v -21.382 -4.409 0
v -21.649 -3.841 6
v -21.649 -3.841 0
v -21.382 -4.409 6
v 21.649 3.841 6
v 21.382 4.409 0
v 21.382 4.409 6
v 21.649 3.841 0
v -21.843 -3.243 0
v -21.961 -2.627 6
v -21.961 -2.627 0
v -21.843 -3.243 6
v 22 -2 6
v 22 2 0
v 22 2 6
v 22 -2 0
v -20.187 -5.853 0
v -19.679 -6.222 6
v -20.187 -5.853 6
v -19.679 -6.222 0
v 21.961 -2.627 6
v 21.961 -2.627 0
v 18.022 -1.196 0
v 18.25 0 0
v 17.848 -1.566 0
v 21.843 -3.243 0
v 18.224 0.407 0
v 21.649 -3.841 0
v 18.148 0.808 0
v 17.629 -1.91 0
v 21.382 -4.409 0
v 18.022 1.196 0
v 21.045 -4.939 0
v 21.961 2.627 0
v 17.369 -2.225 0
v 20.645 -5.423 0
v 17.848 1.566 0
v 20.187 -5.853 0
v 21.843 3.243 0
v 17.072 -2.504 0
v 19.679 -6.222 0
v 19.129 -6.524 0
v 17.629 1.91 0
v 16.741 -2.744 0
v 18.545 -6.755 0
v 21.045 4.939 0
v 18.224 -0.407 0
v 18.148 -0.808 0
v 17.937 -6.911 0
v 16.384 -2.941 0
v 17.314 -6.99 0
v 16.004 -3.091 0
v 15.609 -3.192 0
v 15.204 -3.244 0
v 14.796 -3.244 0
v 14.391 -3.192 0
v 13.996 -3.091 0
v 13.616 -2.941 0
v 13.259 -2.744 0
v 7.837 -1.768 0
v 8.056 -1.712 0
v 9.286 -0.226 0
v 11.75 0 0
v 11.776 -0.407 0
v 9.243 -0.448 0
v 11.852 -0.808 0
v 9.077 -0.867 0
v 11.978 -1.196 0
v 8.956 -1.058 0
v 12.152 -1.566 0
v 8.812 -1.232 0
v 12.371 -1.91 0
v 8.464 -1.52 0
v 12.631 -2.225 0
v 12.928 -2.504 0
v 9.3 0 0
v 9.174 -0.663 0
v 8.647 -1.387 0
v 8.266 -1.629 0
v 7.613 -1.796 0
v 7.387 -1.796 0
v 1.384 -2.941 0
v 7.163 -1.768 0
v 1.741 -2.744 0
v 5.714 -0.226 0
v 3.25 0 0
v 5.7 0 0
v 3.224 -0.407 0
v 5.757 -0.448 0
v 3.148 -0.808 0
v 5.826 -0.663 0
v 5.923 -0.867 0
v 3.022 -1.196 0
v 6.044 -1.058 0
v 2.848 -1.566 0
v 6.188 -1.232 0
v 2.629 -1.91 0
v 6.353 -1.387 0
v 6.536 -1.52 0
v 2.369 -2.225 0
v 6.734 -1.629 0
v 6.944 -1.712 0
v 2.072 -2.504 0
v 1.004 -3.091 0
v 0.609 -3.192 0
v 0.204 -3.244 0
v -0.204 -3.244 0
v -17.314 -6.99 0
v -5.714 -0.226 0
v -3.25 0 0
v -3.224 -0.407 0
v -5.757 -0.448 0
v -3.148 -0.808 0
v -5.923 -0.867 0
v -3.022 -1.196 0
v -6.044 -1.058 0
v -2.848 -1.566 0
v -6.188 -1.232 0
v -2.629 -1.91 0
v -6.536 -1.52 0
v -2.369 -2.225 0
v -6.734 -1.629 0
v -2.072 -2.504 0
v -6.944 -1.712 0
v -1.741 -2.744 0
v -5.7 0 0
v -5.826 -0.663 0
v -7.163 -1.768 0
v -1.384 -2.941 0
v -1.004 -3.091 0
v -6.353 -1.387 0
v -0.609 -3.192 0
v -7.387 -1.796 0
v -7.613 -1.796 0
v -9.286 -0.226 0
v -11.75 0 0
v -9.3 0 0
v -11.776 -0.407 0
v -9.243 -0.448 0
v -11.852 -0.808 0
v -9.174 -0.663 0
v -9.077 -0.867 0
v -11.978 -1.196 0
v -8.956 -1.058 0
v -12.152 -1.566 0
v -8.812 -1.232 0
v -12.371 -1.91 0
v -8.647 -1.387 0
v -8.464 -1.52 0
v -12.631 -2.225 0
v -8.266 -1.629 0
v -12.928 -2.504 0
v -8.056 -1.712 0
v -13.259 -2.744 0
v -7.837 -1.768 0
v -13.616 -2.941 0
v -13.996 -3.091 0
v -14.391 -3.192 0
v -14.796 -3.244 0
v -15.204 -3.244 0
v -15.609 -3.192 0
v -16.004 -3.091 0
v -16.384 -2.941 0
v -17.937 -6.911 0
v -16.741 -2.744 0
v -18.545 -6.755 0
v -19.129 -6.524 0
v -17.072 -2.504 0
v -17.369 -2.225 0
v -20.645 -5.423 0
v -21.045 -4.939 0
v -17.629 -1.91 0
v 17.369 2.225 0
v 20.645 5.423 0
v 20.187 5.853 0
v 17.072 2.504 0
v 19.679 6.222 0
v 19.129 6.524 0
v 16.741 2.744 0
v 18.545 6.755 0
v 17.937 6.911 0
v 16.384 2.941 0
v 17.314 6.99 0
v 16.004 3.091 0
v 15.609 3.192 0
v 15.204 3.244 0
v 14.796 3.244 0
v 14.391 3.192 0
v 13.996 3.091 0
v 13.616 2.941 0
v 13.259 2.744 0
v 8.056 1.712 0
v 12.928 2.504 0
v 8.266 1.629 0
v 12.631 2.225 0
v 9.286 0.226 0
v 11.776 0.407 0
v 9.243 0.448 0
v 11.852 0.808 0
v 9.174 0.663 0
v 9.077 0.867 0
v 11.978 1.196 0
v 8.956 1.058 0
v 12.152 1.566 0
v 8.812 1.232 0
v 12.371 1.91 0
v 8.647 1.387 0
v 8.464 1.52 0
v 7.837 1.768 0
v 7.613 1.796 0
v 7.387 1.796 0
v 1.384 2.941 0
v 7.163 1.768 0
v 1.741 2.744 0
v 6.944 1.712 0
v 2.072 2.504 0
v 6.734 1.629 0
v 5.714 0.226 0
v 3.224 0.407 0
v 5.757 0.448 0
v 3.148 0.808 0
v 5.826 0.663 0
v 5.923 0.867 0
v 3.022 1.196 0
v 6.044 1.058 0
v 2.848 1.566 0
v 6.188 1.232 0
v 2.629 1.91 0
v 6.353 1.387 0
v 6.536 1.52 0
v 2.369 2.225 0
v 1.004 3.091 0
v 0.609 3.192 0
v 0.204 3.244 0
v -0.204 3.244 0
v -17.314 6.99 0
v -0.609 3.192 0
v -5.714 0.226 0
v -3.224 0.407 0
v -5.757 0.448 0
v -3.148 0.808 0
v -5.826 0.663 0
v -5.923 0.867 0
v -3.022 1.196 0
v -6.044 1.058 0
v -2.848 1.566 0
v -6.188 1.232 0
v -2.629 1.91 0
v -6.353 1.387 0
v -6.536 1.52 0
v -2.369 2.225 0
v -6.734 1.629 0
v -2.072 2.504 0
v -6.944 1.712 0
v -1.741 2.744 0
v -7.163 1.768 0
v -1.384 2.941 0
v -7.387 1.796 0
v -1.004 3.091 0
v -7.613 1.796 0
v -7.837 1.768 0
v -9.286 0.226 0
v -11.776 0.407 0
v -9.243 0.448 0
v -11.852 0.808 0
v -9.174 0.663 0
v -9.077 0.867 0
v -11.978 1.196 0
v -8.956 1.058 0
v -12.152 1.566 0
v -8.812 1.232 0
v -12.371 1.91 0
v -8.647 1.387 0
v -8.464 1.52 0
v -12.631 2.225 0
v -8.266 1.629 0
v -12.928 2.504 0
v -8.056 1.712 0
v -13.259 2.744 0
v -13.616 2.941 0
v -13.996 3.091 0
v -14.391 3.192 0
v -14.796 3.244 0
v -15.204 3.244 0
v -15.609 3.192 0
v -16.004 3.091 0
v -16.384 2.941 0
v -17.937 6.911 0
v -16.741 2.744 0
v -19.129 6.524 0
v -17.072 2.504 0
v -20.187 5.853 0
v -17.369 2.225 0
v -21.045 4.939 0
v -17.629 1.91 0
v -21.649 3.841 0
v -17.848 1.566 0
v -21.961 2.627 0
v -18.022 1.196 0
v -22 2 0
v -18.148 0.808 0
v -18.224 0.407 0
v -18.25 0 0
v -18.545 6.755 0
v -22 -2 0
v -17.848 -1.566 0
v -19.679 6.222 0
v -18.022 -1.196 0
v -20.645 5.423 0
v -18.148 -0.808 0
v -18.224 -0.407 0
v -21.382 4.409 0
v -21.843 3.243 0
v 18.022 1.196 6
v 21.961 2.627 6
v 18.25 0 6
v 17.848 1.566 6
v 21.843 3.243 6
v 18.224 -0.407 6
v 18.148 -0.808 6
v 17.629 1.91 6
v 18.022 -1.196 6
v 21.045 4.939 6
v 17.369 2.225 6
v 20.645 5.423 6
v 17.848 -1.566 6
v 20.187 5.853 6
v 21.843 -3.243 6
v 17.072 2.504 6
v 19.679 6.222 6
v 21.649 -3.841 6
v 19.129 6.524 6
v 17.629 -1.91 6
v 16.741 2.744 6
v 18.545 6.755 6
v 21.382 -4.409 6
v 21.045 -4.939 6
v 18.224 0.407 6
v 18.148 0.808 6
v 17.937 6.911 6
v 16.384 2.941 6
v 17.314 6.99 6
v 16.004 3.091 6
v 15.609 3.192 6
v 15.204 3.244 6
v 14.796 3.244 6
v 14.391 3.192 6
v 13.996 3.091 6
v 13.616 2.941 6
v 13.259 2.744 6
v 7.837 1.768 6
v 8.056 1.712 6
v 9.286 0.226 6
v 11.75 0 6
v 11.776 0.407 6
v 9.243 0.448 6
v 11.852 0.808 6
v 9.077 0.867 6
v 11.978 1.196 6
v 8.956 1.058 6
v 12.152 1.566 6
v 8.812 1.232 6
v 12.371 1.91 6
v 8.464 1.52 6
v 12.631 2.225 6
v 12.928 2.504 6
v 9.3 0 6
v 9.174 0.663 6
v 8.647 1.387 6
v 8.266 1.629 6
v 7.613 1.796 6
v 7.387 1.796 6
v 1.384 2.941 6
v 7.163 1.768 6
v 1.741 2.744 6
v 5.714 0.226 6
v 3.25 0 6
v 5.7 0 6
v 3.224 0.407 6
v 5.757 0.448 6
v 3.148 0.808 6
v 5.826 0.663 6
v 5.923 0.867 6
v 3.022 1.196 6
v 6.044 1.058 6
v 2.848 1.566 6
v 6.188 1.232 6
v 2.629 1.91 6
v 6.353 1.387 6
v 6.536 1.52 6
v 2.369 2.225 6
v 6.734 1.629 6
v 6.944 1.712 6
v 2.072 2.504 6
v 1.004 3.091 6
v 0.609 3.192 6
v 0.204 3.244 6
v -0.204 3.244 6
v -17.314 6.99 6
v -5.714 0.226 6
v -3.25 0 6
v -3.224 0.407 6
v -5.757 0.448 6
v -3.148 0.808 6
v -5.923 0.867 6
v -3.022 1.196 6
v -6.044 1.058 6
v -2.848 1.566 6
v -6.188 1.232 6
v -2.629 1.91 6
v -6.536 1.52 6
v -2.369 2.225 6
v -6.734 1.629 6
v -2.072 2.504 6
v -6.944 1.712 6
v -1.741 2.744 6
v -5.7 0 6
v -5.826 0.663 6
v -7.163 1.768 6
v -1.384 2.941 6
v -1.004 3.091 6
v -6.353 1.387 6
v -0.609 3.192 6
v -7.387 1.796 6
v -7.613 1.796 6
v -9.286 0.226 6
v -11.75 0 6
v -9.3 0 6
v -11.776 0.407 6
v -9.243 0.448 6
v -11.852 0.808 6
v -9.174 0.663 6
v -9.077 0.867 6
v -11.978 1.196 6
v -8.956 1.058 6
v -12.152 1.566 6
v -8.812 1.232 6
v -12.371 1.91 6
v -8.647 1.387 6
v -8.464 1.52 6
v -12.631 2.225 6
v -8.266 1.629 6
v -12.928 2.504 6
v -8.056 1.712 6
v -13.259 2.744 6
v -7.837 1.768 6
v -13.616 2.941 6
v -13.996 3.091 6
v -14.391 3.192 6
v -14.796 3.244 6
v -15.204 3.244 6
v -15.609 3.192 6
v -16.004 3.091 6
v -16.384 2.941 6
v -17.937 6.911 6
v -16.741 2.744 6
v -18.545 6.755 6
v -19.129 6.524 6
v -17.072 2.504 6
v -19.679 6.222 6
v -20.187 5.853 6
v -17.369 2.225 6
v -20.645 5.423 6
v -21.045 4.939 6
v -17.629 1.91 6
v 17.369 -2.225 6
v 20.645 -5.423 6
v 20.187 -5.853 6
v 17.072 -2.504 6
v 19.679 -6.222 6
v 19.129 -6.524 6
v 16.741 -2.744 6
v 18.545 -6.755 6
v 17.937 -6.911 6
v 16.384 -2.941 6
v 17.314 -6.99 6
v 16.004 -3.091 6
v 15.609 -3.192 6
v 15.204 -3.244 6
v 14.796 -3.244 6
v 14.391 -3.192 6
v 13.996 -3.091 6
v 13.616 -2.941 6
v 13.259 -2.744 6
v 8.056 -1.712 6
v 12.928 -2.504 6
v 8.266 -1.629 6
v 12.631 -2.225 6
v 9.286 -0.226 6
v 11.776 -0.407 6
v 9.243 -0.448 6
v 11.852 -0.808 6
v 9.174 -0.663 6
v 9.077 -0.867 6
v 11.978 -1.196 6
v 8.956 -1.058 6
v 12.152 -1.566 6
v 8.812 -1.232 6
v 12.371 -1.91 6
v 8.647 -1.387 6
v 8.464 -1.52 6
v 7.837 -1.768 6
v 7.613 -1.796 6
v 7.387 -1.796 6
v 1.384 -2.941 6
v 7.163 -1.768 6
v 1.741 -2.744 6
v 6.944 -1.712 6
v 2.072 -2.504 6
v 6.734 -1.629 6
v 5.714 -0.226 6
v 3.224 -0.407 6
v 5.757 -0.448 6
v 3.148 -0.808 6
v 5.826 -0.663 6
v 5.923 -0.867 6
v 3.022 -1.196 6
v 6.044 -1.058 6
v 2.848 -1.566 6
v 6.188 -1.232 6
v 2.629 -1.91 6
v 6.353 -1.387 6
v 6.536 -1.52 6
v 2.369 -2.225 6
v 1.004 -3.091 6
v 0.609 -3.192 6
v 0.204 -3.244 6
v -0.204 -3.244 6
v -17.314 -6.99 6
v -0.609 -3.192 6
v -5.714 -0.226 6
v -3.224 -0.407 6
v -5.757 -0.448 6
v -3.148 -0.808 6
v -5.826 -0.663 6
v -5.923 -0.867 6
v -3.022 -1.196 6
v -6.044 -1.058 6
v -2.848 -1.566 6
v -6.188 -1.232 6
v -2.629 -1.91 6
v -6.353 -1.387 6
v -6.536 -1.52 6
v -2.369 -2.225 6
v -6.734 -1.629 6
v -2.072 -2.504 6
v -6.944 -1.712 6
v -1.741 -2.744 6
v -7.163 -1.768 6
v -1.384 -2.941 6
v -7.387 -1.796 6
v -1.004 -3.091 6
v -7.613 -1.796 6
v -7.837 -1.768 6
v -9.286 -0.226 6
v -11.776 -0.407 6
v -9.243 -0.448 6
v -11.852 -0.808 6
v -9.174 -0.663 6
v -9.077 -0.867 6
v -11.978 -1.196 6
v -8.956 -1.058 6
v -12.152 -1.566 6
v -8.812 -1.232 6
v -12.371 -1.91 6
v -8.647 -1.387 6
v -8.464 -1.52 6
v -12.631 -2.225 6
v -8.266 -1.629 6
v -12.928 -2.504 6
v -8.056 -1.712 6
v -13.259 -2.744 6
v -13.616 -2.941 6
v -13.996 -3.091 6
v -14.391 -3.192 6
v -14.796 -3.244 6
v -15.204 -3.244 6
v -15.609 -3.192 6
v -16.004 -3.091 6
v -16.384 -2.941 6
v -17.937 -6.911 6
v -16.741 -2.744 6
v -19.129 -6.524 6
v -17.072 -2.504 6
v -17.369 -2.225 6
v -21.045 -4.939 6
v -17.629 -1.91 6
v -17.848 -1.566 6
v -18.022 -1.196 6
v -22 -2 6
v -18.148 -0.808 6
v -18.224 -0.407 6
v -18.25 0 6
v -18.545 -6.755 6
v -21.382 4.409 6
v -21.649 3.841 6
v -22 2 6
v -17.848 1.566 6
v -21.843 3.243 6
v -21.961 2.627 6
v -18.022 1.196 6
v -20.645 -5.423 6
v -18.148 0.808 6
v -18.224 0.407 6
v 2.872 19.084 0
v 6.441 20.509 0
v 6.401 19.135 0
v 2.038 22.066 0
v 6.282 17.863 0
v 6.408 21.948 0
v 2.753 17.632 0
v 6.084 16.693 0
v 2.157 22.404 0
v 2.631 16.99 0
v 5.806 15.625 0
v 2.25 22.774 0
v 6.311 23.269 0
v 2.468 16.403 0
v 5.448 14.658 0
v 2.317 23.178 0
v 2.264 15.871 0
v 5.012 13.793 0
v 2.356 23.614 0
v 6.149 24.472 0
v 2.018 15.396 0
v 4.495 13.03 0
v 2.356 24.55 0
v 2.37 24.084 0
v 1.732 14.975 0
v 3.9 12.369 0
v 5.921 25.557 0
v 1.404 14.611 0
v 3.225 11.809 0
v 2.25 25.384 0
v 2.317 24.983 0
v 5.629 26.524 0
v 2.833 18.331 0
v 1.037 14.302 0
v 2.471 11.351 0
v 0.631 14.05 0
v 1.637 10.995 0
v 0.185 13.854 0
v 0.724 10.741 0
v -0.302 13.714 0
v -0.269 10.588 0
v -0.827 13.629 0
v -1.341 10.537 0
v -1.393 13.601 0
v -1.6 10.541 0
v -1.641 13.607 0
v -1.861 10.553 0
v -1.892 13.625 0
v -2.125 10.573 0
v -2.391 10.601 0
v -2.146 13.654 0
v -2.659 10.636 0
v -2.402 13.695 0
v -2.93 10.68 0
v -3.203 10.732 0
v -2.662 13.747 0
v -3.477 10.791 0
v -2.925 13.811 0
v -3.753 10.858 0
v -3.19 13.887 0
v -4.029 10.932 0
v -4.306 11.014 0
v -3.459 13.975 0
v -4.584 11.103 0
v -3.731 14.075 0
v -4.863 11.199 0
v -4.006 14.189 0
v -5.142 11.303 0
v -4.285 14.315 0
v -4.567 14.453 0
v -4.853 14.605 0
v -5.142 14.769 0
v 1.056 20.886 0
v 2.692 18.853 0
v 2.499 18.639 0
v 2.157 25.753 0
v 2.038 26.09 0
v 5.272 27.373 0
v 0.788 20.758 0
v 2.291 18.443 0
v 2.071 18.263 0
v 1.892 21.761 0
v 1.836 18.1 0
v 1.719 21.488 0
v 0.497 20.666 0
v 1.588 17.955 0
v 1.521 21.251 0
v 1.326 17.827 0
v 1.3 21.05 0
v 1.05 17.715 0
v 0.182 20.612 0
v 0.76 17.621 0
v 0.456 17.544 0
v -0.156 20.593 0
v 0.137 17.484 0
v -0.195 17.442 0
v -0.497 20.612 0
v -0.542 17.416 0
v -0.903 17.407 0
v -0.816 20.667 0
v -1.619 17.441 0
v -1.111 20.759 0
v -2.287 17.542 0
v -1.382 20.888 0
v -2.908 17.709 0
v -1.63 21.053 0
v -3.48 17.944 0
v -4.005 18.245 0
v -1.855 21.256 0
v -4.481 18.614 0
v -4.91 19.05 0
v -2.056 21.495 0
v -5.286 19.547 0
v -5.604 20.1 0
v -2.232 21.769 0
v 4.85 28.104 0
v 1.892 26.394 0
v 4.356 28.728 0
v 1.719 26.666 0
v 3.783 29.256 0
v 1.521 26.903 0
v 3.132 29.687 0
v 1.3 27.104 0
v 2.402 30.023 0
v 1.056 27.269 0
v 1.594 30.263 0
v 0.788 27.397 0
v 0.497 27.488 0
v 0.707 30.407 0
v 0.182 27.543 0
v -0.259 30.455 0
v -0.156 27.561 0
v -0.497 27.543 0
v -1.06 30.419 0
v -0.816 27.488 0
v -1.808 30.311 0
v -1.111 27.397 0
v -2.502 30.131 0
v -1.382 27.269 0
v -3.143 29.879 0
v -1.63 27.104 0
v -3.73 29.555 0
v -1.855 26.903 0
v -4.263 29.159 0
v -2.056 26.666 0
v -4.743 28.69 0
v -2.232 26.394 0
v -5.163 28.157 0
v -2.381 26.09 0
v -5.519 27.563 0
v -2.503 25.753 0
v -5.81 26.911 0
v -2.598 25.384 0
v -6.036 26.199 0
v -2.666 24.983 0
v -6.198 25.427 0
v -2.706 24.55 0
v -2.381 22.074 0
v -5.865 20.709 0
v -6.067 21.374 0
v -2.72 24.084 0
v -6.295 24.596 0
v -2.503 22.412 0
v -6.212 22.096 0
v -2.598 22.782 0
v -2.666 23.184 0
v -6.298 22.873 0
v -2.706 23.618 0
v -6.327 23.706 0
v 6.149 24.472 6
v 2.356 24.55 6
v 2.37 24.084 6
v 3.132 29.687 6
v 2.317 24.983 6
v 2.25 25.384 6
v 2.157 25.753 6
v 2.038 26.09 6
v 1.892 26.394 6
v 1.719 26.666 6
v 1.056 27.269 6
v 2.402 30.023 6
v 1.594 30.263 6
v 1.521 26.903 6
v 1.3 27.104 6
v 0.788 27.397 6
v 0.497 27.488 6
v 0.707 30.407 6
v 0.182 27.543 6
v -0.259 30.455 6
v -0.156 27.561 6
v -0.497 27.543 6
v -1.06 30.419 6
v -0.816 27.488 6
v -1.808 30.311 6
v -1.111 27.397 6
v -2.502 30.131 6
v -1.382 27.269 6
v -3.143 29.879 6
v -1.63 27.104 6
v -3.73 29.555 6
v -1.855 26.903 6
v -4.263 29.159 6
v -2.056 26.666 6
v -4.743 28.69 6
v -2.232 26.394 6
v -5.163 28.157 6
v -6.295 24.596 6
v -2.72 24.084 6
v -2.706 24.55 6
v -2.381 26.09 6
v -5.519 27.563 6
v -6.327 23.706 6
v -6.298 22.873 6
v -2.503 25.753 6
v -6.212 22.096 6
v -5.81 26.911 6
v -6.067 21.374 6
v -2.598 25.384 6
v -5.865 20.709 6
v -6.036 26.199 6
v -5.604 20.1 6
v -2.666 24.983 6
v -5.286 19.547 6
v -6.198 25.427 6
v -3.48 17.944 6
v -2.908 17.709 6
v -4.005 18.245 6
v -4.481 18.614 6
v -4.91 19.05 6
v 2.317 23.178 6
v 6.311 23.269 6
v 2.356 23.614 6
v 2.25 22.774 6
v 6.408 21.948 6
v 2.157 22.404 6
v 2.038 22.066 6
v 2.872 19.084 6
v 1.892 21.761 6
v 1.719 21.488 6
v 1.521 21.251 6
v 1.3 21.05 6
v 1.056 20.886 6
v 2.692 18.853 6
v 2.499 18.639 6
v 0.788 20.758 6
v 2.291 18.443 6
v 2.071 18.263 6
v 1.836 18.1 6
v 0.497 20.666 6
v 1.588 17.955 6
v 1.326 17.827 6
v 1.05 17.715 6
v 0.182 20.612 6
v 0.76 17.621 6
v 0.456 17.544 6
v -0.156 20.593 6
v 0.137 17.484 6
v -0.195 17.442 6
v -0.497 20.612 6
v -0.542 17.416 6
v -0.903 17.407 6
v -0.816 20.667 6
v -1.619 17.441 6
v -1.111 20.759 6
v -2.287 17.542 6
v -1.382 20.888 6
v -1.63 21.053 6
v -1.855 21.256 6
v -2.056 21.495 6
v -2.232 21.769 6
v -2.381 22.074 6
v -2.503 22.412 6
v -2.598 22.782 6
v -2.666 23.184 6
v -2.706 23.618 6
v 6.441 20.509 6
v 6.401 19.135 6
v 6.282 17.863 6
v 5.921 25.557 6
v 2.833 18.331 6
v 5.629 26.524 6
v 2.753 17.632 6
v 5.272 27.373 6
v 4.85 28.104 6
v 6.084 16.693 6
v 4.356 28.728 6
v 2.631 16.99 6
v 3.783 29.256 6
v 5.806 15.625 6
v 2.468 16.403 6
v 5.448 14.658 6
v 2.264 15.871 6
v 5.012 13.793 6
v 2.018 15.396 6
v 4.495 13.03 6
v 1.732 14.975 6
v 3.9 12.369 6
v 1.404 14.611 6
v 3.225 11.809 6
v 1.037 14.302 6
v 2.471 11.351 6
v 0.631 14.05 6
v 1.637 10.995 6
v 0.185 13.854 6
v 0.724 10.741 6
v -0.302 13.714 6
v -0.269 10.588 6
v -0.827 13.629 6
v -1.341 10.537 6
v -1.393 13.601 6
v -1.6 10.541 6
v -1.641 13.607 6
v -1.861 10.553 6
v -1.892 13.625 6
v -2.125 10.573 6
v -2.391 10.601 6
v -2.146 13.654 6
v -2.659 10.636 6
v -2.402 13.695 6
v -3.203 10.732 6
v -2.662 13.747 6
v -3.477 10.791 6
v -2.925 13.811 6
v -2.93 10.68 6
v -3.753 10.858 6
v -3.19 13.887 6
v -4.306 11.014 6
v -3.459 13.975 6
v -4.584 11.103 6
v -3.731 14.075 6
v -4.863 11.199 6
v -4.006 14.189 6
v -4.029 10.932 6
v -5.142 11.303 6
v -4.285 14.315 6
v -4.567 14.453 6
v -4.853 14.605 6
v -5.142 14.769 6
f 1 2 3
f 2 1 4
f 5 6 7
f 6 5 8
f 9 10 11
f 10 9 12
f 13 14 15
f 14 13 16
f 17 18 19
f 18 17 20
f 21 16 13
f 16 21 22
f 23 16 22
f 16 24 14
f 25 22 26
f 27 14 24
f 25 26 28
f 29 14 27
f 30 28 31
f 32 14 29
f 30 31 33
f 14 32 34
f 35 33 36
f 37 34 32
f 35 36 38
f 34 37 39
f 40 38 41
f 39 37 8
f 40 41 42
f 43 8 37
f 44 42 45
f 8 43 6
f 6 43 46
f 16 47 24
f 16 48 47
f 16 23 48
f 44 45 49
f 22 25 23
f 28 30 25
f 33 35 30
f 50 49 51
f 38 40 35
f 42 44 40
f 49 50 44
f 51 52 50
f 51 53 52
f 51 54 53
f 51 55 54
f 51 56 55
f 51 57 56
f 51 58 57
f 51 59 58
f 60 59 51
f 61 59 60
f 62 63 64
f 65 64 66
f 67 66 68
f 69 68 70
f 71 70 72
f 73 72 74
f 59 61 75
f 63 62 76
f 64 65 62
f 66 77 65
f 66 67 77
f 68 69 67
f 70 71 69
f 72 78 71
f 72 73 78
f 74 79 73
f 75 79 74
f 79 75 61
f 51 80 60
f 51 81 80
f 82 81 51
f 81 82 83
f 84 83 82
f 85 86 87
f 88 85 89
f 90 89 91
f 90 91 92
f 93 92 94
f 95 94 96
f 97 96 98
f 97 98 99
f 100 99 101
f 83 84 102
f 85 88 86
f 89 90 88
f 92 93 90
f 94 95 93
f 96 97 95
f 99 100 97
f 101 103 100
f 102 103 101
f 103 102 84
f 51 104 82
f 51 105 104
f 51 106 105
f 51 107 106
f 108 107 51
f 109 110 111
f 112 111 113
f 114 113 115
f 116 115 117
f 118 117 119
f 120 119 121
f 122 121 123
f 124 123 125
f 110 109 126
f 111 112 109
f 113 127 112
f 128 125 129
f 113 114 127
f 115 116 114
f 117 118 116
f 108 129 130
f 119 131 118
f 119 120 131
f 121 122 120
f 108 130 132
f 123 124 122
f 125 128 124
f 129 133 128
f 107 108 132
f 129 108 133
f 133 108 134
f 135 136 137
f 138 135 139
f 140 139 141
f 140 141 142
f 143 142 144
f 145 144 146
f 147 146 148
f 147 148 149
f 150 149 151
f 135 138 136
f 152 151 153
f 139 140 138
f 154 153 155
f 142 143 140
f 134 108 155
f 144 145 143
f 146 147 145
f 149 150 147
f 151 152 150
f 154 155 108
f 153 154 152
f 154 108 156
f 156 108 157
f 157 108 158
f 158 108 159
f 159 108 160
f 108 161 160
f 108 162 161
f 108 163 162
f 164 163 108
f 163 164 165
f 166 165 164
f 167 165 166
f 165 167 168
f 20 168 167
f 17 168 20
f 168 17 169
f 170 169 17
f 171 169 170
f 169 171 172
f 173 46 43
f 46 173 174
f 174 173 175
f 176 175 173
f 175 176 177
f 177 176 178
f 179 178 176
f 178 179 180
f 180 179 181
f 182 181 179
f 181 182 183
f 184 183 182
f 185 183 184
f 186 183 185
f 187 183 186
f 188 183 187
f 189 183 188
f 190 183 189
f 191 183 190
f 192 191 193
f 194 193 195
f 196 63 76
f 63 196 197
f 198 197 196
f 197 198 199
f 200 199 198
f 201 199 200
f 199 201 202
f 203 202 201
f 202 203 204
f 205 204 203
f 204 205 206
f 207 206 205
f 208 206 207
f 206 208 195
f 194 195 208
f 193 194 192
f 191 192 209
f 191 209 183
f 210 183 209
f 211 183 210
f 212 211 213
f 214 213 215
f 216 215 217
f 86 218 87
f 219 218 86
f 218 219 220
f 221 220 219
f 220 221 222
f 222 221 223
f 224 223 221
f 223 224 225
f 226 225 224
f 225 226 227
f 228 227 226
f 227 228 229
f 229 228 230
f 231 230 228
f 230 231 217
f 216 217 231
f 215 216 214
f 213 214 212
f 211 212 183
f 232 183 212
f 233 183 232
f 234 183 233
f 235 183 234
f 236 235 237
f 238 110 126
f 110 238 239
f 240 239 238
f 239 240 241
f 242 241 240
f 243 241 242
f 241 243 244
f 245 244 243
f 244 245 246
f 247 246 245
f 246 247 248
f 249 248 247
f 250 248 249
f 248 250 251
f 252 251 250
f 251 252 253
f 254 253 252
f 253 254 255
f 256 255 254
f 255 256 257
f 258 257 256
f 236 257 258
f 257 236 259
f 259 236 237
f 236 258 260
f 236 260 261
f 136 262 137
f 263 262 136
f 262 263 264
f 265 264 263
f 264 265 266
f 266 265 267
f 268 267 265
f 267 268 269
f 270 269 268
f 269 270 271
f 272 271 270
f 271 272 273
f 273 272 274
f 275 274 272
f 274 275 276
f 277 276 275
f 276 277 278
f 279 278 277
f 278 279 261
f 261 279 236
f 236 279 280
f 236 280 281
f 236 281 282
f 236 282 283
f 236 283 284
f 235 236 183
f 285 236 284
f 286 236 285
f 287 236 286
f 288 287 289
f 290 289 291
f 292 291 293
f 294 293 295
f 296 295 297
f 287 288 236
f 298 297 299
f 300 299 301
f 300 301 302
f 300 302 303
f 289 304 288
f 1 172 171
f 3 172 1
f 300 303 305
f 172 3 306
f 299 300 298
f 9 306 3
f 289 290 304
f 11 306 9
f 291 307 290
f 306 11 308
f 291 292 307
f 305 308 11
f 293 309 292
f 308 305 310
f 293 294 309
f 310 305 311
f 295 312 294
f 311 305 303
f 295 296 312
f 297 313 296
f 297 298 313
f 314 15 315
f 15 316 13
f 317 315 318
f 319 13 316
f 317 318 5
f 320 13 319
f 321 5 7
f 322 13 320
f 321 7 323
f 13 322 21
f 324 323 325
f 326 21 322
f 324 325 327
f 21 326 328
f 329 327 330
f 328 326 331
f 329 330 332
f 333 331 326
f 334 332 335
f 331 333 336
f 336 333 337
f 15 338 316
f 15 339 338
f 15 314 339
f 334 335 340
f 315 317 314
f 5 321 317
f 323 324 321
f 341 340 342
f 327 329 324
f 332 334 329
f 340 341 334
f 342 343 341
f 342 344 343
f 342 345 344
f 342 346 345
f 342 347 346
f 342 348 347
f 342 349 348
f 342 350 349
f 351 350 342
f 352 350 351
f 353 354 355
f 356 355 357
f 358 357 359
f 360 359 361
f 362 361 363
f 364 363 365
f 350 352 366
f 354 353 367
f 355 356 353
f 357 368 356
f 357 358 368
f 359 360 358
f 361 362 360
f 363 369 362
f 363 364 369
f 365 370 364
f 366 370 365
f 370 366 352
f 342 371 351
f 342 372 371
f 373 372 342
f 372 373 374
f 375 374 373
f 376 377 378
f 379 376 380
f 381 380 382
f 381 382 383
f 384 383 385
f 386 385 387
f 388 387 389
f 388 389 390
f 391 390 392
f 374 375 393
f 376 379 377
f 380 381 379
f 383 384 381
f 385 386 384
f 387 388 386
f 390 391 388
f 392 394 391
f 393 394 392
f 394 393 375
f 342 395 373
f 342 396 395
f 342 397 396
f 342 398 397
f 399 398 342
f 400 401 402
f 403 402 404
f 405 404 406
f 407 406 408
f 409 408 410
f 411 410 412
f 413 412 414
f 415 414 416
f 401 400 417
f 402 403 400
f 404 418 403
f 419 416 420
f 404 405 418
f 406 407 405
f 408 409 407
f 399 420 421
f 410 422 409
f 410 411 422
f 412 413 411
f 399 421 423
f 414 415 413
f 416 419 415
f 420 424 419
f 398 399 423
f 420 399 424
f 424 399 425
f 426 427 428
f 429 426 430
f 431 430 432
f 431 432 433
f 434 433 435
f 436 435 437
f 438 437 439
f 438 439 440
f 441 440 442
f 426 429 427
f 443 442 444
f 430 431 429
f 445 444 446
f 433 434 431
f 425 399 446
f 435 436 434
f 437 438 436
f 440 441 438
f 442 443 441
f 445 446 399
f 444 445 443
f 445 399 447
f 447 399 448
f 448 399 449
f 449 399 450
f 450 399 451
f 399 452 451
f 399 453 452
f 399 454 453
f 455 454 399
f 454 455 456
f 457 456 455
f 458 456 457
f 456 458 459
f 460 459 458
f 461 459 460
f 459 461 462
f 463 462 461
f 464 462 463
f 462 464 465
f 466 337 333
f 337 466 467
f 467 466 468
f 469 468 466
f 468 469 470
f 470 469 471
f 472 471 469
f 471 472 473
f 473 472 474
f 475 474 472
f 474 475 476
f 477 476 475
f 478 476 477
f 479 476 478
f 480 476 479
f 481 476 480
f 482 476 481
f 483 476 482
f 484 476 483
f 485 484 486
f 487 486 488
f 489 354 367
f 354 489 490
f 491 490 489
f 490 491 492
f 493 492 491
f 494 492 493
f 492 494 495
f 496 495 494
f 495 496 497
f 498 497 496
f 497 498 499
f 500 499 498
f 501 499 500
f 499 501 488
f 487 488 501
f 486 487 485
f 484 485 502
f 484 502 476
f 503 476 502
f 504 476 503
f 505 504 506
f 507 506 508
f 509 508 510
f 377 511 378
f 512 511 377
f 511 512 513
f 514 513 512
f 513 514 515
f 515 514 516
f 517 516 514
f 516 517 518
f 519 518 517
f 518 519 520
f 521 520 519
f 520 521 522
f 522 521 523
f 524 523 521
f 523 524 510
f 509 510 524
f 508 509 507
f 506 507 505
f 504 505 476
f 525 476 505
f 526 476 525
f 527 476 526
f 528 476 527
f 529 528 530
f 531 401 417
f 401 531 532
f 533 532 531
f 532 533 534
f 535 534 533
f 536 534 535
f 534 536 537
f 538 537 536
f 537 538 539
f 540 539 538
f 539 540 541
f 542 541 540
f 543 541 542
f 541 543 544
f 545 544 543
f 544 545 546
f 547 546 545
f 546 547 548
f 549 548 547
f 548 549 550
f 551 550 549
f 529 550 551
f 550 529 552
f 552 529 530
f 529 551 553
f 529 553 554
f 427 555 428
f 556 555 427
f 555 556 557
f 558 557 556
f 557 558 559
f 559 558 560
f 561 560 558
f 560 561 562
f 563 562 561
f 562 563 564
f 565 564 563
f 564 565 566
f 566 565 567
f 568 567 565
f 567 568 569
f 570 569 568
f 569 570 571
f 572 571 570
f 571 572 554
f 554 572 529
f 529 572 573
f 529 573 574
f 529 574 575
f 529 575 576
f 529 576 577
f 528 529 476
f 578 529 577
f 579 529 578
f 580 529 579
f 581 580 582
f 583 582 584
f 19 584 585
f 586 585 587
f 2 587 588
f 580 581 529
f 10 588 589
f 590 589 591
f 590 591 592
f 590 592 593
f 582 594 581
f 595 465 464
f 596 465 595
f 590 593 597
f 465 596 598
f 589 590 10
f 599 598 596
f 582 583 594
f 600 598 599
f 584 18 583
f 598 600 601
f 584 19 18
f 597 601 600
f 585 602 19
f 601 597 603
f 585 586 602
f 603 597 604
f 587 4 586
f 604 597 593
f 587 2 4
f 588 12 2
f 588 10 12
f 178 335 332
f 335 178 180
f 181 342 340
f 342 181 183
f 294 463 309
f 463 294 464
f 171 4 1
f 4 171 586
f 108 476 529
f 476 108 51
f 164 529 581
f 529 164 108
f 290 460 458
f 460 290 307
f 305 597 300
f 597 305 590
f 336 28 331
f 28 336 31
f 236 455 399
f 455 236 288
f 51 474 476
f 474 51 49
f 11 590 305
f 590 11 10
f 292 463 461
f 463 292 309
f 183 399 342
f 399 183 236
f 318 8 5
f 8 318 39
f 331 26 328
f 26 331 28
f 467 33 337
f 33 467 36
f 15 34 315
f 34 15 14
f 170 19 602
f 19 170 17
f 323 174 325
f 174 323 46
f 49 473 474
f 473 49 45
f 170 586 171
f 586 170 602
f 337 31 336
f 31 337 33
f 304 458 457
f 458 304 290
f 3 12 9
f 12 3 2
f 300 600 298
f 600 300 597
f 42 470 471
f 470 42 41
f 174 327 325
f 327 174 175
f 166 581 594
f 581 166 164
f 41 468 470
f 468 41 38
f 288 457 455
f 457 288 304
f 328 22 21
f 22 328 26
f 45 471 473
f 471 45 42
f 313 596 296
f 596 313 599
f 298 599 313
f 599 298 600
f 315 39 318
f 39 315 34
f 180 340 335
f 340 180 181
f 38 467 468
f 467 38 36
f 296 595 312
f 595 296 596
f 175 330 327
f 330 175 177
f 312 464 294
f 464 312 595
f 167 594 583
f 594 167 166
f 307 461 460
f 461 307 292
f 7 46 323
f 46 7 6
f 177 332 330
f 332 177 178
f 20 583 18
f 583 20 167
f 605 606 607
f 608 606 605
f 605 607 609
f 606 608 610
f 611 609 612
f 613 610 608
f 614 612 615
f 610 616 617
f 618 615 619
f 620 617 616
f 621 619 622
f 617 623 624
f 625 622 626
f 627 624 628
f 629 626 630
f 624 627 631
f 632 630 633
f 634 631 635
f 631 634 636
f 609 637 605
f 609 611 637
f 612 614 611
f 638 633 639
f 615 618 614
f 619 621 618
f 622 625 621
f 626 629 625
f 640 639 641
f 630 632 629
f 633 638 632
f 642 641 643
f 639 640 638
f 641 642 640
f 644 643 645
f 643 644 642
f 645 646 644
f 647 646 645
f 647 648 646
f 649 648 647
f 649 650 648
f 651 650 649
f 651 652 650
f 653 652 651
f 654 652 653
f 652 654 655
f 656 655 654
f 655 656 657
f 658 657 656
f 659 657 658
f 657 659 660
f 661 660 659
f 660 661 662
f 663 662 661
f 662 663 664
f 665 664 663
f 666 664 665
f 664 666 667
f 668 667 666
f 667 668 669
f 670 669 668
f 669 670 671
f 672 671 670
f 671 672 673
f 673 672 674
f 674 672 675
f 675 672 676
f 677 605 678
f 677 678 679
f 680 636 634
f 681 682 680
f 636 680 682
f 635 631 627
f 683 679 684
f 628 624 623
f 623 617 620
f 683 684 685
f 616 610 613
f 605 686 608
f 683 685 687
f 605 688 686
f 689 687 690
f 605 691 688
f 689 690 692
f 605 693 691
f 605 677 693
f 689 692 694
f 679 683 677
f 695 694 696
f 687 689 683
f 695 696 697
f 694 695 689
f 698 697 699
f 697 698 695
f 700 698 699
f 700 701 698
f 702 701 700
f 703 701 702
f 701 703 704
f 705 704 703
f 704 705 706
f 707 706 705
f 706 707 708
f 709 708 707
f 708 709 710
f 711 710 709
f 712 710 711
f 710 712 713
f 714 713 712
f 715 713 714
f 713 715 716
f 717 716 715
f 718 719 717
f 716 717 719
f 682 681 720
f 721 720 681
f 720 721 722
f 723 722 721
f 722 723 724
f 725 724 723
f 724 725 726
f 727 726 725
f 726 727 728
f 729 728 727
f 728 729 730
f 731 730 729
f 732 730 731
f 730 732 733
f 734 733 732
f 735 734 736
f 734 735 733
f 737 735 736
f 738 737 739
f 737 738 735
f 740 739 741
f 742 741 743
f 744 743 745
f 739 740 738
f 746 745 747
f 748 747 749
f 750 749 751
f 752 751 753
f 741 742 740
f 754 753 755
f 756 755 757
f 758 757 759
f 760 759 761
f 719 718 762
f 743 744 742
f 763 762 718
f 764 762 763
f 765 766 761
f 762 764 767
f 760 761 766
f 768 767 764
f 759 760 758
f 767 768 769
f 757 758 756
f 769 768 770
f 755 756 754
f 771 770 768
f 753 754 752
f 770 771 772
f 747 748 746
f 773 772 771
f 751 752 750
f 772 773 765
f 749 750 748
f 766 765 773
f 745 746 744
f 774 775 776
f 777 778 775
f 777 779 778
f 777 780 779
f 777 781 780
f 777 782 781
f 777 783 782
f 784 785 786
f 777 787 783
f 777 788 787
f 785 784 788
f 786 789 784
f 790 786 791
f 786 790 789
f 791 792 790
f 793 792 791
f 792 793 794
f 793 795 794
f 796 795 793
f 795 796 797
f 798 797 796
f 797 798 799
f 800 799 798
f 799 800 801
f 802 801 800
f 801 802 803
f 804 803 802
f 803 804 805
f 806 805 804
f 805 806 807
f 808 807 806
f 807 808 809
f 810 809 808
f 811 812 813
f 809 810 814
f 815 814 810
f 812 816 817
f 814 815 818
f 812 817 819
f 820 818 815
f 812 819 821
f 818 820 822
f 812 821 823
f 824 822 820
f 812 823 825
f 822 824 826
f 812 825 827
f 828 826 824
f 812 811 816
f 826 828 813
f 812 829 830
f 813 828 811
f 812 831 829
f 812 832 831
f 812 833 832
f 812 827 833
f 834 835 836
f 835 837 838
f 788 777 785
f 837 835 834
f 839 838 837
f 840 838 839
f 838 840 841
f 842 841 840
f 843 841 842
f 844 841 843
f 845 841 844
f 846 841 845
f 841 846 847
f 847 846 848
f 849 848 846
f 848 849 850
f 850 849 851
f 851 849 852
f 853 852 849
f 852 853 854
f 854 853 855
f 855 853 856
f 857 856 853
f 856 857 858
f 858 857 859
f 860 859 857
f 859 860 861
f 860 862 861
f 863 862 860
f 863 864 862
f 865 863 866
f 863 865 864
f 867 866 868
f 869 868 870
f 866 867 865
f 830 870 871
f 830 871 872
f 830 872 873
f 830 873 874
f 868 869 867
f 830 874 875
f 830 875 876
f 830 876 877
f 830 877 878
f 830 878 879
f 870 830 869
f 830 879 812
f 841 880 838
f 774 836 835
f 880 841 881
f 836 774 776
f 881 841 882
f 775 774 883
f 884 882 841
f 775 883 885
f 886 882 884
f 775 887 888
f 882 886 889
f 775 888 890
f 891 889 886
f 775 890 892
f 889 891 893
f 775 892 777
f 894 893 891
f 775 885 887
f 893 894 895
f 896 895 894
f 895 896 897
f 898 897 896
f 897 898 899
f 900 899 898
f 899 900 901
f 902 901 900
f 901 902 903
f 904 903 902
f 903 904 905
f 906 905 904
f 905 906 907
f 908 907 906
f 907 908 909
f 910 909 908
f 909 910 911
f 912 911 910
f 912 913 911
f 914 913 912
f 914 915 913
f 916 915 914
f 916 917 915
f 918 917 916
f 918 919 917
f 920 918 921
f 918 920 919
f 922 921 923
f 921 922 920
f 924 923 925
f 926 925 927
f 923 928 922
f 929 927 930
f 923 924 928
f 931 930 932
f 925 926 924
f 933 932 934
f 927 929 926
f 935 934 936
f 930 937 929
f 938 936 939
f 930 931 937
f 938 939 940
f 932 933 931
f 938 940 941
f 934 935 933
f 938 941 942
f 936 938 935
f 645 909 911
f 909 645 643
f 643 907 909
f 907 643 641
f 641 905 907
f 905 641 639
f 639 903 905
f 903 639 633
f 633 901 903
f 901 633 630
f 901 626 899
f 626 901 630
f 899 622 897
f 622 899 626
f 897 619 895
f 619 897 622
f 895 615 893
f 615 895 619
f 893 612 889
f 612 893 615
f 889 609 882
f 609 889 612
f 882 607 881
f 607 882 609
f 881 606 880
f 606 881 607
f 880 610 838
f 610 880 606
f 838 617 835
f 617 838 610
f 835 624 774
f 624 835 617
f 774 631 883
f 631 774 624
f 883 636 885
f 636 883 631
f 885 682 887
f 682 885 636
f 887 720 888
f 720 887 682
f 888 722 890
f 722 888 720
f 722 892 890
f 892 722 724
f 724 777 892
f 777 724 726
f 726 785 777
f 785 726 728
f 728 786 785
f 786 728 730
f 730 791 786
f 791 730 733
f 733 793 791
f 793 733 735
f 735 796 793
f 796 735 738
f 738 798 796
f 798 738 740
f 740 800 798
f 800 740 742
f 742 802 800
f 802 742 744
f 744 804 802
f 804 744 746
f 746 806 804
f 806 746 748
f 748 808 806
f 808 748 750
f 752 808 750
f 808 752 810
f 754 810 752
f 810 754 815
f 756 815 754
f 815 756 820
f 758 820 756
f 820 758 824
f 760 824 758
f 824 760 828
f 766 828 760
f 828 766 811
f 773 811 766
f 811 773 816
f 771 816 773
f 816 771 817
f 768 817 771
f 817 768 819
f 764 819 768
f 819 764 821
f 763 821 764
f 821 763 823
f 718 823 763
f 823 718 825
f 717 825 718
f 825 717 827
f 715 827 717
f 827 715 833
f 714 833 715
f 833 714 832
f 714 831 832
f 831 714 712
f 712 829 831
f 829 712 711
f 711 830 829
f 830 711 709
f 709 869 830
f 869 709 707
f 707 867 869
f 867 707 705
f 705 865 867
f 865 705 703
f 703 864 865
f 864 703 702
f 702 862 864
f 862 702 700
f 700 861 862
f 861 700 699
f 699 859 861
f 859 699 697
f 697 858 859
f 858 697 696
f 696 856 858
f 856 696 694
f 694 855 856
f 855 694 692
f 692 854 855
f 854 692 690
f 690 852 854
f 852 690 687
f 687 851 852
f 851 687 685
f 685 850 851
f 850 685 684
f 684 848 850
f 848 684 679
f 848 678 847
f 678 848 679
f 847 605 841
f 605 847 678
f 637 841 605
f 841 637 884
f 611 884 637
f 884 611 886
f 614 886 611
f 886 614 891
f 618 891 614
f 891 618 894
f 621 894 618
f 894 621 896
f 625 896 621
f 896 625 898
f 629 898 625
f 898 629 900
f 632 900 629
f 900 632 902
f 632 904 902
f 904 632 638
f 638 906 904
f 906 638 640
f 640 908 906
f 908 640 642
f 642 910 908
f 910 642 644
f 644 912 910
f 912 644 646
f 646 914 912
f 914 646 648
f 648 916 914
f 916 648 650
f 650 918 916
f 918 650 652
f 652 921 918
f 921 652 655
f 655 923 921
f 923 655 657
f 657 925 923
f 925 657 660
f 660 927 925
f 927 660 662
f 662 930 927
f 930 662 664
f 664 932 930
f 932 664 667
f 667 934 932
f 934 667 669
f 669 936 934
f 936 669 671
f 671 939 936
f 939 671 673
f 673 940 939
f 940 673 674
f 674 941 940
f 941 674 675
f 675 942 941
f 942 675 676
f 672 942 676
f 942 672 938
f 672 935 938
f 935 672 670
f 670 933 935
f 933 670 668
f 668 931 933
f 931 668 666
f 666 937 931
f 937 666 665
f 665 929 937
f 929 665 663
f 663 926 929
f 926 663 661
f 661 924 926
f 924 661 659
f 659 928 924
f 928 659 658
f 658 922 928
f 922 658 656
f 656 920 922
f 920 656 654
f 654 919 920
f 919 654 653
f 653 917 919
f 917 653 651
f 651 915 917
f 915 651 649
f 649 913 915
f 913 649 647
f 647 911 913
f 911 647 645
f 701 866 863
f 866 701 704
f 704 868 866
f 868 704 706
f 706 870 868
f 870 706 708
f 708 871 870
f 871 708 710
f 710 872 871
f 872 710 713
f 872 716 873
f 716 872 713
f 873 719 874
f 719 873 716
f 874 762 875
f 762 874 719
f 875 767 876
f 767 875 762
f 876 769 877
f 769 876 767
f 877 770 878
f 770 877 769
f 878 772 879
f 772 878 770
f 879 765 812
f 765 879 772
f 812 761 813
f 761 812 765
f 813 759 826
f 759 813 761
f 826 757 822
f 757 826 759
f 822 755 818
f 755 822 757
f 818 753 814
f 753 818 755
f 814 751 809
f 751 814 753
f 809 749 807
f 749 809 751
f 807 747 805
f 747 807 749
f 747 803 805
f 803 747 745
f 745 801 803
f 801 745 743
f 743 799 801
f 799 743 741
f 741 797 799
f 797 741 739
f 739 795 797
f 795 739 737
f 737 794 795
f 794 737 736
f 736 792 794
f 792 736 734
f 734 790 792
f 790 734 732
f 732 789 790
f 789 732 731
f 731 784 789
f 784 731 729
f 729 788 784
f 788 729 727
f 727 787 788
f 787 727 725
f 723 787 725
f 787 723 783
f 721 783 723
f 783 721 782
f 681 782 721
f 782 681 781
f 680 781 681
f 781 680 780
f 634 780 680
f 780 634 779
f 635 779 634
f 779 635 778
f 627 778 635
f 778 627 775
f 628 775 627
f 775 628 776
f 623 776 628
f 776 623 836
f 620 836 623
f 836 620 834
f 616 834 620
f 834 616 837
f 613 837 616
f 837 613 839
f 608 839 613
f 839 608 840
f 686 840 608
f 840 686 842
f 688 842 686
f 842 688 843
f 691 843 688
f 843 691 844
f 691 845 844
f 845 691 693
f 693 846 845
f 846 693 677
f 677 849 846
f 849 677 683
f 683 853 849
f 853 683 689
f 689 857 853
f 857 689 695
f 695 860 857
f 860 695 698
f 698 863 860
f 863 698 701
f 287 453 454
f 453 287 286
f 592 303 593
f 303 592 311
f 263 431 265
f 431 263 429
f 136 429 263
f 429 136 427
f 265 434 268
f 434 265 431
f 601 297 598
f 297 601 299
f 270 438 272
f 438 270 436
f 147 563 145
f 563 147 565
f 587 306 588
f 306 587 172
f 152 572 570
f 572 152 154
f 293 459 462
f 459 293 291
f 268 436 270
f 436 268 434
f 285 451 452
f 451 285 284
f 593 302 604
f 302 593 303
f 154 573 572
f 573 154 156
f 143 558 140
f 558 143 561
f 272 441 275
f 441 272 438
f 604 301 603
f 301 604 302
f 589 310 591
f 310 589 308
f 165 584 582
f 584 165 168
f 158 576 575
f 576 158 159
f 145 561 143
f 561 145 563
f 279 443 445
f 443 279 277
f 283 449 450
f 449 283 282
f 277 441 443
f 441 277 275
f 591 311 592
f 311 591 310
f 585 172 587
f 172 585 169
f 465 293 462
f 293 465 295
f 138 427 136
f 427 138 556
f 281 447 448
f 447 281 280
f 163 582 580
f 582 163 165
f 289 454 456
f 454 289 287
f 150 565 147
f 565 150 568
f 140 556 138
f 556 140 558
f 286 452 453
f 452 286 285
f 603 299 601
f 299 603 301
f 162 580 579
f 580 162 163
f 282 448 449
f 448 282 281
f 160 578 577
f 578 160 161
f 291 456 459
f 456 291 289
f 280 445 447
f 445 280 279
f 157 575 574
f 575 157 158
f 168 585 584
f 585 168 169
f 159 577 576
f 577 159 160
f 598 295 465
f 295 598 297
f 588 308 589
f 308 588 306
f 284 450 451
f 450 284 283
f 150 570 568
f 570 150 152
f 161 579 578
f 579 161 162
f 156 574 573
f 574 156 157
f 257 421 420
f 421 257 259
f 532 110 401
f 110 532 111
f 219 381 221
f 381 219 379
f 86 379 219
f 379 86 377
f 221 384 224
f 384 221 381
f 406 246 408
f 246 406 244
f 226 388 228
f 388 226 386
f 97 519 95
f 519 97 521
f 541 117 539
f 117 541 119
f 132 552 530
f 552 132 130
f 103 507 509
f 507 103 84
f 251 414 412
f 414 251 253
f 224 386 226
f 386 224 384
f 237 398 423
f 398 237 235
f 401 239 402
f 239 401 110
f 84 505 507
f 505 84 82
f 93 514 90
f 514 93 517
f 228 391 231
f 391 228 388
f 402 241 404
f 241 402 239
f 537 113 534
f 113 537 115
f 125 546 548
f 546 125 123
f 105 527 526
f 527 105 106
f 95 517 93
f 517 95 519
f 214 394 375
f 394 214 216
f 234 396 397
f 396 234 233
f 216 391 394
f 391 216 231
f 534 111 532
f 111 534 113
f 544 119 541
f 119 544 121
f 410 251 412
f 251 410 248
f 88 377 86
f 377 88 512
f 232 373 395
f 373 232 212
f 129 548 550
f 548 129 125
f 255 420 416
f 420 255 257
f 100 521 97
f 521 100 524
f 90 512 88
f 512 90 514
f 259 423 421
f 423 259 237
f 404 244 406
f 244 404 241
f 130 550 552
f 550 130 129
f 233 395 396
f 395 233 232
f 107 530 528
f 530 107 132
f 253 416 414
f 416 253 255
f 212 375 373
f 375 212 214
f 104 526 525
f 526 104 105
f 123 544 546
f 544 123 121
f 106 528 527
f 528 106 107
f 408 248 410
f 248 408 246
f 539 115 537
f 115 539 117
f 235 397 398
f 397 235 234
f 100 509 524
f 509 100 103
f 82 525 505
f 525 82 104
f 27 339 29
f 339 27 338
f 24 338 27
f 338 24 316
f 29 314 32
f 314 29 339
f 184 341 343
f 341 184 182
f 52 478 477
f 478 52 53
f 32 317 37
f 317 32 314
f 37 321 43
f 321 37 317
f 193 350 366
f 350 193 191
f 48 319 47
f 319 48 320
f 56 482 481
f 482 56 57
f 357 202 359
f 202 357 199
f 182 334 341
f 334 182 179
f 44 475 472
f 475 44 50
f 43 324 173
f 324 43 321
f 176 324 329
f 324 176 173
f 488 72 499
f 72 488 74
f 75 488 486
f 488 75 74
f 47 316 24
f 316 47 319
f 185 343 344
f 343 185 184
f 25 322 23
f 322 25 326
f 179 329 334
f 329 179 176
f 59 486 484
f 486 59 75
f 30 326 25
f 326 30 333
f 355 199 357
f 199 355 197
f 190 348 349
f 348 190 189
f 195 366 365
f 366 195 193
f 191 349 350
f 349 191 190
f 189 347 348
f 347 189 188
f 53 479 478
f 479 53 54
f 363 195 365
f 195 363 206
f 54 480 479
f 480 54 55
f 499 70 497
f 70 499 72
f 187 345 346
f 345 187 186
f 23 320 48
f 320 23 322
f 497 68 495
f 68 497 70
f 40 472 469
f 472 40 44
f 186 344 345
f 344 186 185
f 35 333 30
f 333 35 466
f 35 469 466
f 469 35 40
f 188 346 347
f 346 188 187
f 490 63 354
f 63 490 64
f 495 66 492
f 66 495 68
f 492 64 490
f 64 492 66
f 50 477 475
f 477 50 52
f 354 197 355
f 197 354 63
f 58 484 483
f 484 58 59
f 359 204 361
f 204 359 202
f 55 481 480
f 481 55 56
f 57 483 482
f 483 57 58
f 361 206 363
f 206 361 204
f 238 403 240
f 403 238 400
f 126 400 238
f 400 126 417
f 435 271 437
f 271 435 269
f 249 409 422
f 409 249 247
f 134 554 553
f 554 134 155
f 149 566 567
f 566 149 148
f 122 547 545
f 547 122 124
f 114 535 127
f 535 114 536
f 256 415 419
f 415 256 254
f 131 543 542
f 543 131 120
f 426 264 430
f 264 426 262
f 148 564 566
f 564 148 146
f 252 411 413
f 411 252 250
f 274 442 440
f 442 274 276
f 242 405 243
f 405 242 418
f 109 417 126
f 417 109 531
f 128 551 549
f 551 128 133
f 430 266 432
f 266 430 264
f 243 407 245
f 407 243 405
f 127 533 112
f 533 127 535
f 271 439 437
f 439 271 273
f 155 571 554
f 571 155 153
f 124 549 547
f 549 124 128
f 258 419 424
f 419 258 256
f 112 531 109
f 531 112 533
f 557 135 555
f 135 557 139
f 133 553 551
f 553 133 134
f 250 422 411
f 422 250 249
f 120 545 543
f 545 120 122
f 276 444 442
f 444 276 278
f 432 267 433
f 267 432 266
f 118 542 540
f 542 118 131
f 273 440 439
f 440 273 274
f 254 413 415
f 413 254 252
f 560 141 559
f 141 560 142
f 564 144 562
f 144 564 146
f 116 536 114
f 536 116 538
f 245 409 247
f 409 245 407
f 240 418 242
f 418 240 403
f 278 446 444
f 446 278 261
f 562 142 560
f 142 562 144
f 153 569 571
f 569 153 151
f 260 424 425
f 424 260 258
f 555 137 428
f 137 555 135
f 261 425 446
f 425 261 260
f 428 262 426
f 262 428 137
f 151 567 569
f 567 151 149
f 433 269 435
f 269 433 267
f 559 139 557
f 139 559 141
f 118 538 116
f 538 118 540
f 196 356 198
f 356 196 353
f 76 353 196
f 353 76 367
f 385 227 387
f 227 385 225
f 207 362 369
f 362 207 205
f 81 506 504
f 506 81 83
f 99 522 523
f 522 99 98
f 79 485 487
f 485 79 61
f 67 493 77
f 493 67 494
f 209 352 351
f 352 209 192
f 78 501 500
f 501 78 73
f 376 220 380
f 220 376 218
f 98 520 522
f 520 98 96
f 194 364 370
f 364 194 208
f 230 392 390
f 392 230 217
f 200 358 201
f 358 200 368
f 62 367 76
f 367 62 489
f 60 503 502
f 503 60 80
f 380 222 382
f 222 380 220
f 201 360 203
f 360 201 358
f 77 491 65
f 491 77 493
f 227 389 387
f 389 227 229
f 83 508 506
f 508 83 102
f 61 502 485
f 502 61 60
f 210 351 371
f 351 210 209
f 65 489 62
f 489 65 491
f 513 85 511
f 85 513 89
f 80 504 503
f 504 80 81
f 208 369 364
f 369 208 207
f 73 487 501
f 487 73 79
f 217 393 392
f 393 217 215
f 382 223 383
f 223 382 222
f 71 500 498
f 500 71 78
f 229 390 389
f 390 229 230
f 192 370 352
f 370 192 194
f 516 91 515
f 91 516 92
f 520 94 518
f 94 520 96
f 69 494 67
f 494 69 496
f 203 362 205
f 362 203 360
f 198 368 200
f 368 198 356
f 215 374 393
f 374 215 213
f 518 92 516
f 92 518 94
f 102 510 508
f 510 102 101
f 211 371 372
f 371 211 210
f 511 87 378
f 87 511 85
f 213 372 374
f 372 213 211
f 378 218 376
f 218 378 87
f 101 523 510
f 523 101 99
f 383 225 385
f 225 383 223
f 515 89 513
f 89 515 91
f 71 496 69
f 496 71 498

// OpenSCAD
$fn = 50;


difference() {
	union() {
		hull() {
			translate(v = [-17.0000000000, 2.0000000000, 0]) {
				cylinder(h = 6, r = 5);
			}
			translate(v = [17.0000000000, 2.0000000000, 0]) {
				cylinder(h = 6, r = 5);
			}
			translate(v = [-17.0000000000, -2.0000000000, 0]) {
				cylinder(h = 6, r = 5);
			}
			translate(v = [17.0000000000, -2.0000000000, 0]) {
				cylinder(h = 6, r = 5);
			}
		}
		translate(v = [0, 30.0000000000, 0]) {
			linear_extrude(height = 6) {
				text(font = "DejaVu Sans Mono:style=Bold", halign = "center", size = 19.0000000000, text = "9", valign = "top");
			}
		}
	}
	union() {
		translate(v = [-15.0000000000, 0.0000000000, 0]) {
			translate(v = [0, 0, -100]) {
				cylinder(h = 200, r = 3.2500000000);
			}
		}
		translate(v = [0, 0, -100]) {
			cylinder(h = 200, r = 3.2500000000);
		}
		translate(v = [15.0000000000, 0.0000000000, 0]) {
			translate(v = [0, 0, -100]) {
				cylinder(h = 200, r = 3.2500000000);
			}
		}
		translate(v = [-15.0000000000, 0.0000000000, 0]) {
			translate(v = [0, 0, -100]) {
				cylinder(h = 200, r = 1.8000000000);
			}
		}
		translate(v = [-7.5000000000, 0.0000000000, 0]) {
			translate(v = [0, 0, -100]) {
				cylinder(h = 200, r = 1.8000000000);
			}
		}
		translate(v = [0, 0, -100]) {
			cylinder(h = 200, r = 1.8000000000);
		}
		translate(v = [7.5000000000, 0.0000000000, 0]) {
			translate(v = [0, 0, -100]) {
				cylinder(h = 200, r = 1.8000000000);
			}
		}
		translate(v = [15.0000000000, 0.0000000000, 0]) {
			translate(v = [0, 0, -100]) {
				cylinder(h = 200, r = 1.8000000000);
			}
		}
	}
}
